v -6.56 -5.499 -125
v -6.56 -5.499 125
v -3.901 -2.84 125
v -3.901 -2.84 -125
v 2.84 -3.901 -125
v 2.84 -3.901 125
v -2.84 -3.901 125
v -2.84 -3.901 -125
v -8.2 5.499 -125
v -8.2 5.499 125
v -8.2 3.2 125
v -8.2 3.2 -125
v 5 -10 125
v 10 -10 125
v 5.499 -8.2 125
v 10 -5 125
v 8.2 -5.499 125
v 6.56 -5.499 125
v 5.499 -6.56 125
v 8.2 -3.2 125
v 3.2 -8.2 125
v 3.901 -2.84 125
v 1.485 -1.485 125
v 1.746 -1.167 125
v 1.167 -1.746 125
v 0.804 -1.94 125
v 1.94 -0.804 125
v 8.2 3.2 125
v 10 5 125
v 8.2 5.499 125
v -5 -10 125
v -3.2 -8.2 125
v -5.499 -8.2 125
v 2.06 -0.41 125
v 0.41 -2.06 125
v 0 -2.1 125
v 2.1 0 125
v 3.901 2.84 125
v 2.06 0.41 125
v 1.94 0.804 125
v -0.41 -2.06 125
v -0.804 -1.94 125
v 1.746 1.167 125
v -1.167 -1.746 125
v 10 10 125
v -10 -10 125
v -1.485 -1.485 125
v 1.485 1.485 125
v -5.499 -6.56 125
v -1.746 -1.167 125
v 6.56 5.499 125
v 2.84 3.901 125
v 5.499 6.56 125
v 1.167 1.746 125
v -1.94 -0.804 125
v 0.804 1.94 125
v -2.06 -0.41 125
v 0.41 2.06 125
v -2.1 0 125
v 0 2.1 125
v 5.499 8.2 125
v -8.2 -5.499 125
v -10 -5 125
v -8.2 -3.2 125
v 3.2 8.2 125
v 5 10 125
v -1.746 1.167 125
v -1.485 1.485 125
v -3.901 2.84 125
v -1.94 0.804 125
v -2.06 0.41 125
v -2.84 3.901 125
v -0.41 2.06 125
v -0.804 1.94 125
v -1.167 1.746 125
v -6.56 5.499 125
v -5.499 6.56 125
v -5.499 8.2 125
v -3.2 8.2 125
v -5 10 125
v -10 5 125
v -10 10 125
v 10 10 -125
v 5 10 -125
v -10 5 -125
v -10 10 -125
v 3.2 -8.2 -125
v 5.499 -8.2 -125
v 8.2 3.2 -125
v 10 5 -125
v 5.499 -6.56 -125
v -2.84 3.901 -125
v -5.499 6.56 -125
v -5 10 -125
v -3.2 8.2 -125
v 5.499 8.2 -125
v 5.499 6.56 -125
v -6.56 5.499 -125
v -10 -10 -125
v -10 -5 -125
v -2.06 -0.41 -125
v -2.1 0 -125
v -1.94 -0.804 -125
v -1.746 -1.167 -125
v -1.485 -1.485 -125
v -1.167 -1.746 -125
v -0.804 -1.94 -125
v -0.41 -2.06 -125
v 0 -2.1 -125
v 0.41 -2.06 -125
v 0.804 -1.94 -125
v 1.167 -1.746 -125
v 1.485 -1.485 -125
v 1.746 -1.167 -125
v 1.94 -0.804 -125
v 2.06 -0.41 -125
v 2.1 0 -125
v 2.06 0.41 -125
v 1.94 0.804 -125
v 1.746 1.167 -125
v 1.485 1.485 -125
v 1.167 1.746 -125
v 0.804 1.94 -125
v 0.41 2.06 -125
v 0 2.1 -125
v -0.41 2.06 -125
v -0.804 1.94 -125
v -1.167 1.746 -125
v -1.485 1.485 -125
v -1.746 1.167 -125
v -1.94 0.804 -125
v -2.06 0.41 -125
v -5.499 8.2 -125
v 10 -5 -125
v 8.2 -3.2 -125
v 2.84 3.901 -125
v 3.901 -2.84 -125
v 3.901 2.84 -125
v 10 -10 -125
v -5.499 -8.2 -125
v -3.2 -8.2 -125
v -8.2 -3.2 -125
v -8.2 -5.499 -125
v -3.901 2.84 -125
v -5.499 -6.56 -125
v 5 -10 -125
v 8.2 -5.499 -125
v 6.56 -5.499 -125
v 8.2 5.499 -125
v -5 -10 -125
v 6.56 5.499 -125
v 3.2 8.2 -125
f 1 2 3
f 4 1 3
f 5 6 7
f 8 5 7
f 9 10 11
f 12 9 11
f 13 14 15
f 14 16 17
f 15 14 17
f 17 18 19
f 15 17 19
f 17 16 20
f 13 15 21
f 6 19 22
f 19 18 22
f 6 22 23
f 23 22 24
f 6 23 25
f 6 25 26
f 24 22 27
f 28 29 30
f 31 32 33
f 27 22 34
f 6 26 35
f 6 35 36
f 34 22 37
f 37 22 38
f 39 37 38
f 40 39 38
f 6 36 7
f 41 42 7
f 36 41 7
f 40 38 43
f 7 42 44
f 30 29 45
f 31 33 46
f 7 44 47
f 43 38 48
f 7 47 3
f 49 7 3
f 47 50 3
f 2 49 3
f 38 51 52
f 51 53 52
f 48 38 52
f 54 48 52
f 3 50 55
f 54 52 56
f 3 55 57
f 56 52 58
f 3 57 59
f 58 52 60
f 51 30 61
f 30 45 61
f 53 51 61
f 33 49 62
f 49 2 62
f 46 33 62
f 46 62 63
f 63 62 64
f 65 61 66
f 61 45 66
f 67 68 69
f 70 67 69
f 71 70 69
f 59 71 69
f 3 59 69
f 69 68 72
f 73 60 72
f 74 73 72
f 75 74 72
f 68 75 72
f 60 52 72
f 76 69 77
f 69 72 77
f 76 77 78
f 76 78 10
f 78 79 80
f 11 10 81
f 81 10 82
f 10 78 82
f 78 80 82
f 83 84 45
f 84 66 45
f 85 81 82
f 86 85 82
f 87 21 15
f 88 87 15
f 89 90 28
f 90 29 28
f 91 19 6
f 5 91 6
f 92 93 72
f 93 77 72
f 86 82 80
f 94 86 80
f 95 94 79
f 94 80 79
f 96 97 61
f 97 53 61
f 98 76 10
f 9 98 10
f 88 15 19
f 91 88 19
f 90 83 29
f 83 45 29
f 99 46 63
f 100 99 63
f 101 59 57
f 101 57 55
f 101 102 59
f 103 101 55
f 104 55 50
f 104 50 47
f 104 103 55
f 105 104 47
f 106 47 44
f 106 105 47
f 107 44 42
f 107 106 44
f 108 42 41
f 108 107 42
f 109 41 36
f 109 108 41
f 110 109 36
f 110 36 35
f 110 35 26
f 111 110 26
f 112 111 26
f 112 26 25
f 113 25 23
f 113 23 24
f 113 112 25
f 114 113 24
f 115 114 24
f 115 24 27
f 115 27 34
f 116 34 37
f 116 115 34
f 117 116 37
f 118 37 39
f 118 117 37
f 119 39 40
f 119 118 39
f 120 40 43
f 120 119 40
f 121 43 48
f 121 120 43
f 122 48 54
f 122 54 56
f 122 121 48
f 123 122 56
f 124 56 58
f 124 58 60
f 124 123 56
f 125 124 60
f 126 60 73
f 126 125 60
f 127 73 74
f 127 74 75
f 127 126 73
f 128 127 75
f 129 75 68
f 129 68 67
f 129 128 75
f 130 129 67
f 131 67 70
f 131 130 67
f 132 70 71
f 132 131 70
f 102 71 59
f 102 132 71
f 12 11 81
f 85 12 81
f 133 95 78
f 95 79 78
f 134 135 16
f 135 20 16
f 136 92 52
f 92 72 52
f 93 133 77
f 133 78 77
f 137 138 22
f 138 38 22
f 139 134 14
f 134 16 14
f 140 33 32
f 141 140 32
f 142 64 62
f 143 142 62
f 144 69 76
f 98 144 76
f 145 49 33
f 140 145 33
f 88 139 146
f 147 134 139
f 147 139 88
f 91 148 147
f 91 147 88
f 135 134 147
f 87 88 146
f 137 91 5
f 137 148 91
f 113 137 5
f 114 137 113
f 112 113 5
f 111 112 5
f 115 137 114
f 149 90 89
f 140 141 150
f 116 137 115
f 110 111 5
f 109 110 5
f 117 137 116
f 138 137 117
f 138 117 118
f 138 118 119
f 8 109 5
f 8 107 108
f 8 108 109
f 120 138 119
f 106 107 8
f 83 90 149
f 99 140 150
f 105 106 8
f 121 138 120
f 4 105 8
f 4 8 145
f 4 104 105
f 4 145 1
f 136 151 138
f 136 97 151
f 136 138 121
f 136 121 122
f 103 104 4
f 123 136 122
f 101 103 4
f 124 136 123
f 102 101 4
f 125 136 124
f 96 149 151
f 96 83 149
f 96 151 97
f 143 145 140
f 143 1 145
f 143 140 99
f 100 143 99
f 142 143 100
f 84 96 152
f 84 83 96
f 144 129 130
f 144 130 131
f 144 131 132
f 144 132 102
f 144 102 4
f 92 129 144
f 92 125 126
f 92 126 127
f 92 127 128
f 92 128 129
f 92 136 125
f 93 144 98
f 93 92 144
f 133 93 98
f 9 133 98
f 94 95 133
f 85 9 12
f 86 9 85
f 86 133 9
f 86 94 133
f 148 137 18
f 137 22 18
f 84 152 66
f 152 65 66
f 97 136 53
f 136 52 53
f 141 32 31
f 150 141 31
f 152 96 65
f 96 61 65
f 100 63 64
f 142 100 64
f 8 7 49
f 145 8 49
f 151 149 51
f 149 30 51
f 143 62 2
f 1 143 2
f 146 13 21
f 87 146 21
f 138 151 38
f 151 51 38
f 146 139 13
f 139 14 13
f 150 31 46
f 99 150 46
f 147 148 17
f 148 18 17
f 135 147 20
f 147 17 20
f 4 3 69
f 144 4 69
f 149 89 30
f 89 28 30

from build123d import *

# Parameters (mm, degrees)
SKETCH1_R           = 2.1
BOSS_EXTRUDE1_DEPTH = 125


with BuildPart() as part:
    # Sketch1 → Boss-Extrude1 (new, symmetric)
    with BuildSketch(Plane.XY):
        Polygon((-10, 10), (-5, 10), (-3.2, 8.2), (-5.499339828, 8.2), (-5.499339828, 6.56), (-2.84, 3.900660172), (2.84, 3.900660172), (5.499339828, 6.56), (5.499339828, 8.2), (3.2, 8.2), (5, 10), (10, 10), (10, 5), (8.2, 3.2), (8.2, 5.499339828), (6.56, 5.499339828), (3.900660172, 2.84), (3.900660172, -2.84), (6.56, -5.499339828), (8.2, -5.499339828), (8.2, -3.2), (10, -5), (10, -10), (5, -10), (3.2, -8.2), (5.499339828, -8.2), (5.499339828, -6.56), (2.84, -3.900660172), (-2.84, -3.900660172), (-5.499339828, -6.56), (-5.499339828, -8.2), (-3.2, -8.2), (-5, -10), (-10, -10), (-10, -5), (-8.2, -3.2), (-8.2, -5.499339828), (-6.56, -5.499339828), (-3.900660172, -2.84), (-3.900660172, 2.84), (-6.56, 5.499339828), (-8.2, 5.499339828), (-8.2, 3.2), (-10, 5), align=None)
        with Locations(Location((0, 0, 0), (0, 0, 180))):
            Circle(SKETCH1_R, mode=Mode.SUBTRACT)
    extrude(amount=BOSS_EXTRUDE1_DEPTH, both=True)


solid = part.part
